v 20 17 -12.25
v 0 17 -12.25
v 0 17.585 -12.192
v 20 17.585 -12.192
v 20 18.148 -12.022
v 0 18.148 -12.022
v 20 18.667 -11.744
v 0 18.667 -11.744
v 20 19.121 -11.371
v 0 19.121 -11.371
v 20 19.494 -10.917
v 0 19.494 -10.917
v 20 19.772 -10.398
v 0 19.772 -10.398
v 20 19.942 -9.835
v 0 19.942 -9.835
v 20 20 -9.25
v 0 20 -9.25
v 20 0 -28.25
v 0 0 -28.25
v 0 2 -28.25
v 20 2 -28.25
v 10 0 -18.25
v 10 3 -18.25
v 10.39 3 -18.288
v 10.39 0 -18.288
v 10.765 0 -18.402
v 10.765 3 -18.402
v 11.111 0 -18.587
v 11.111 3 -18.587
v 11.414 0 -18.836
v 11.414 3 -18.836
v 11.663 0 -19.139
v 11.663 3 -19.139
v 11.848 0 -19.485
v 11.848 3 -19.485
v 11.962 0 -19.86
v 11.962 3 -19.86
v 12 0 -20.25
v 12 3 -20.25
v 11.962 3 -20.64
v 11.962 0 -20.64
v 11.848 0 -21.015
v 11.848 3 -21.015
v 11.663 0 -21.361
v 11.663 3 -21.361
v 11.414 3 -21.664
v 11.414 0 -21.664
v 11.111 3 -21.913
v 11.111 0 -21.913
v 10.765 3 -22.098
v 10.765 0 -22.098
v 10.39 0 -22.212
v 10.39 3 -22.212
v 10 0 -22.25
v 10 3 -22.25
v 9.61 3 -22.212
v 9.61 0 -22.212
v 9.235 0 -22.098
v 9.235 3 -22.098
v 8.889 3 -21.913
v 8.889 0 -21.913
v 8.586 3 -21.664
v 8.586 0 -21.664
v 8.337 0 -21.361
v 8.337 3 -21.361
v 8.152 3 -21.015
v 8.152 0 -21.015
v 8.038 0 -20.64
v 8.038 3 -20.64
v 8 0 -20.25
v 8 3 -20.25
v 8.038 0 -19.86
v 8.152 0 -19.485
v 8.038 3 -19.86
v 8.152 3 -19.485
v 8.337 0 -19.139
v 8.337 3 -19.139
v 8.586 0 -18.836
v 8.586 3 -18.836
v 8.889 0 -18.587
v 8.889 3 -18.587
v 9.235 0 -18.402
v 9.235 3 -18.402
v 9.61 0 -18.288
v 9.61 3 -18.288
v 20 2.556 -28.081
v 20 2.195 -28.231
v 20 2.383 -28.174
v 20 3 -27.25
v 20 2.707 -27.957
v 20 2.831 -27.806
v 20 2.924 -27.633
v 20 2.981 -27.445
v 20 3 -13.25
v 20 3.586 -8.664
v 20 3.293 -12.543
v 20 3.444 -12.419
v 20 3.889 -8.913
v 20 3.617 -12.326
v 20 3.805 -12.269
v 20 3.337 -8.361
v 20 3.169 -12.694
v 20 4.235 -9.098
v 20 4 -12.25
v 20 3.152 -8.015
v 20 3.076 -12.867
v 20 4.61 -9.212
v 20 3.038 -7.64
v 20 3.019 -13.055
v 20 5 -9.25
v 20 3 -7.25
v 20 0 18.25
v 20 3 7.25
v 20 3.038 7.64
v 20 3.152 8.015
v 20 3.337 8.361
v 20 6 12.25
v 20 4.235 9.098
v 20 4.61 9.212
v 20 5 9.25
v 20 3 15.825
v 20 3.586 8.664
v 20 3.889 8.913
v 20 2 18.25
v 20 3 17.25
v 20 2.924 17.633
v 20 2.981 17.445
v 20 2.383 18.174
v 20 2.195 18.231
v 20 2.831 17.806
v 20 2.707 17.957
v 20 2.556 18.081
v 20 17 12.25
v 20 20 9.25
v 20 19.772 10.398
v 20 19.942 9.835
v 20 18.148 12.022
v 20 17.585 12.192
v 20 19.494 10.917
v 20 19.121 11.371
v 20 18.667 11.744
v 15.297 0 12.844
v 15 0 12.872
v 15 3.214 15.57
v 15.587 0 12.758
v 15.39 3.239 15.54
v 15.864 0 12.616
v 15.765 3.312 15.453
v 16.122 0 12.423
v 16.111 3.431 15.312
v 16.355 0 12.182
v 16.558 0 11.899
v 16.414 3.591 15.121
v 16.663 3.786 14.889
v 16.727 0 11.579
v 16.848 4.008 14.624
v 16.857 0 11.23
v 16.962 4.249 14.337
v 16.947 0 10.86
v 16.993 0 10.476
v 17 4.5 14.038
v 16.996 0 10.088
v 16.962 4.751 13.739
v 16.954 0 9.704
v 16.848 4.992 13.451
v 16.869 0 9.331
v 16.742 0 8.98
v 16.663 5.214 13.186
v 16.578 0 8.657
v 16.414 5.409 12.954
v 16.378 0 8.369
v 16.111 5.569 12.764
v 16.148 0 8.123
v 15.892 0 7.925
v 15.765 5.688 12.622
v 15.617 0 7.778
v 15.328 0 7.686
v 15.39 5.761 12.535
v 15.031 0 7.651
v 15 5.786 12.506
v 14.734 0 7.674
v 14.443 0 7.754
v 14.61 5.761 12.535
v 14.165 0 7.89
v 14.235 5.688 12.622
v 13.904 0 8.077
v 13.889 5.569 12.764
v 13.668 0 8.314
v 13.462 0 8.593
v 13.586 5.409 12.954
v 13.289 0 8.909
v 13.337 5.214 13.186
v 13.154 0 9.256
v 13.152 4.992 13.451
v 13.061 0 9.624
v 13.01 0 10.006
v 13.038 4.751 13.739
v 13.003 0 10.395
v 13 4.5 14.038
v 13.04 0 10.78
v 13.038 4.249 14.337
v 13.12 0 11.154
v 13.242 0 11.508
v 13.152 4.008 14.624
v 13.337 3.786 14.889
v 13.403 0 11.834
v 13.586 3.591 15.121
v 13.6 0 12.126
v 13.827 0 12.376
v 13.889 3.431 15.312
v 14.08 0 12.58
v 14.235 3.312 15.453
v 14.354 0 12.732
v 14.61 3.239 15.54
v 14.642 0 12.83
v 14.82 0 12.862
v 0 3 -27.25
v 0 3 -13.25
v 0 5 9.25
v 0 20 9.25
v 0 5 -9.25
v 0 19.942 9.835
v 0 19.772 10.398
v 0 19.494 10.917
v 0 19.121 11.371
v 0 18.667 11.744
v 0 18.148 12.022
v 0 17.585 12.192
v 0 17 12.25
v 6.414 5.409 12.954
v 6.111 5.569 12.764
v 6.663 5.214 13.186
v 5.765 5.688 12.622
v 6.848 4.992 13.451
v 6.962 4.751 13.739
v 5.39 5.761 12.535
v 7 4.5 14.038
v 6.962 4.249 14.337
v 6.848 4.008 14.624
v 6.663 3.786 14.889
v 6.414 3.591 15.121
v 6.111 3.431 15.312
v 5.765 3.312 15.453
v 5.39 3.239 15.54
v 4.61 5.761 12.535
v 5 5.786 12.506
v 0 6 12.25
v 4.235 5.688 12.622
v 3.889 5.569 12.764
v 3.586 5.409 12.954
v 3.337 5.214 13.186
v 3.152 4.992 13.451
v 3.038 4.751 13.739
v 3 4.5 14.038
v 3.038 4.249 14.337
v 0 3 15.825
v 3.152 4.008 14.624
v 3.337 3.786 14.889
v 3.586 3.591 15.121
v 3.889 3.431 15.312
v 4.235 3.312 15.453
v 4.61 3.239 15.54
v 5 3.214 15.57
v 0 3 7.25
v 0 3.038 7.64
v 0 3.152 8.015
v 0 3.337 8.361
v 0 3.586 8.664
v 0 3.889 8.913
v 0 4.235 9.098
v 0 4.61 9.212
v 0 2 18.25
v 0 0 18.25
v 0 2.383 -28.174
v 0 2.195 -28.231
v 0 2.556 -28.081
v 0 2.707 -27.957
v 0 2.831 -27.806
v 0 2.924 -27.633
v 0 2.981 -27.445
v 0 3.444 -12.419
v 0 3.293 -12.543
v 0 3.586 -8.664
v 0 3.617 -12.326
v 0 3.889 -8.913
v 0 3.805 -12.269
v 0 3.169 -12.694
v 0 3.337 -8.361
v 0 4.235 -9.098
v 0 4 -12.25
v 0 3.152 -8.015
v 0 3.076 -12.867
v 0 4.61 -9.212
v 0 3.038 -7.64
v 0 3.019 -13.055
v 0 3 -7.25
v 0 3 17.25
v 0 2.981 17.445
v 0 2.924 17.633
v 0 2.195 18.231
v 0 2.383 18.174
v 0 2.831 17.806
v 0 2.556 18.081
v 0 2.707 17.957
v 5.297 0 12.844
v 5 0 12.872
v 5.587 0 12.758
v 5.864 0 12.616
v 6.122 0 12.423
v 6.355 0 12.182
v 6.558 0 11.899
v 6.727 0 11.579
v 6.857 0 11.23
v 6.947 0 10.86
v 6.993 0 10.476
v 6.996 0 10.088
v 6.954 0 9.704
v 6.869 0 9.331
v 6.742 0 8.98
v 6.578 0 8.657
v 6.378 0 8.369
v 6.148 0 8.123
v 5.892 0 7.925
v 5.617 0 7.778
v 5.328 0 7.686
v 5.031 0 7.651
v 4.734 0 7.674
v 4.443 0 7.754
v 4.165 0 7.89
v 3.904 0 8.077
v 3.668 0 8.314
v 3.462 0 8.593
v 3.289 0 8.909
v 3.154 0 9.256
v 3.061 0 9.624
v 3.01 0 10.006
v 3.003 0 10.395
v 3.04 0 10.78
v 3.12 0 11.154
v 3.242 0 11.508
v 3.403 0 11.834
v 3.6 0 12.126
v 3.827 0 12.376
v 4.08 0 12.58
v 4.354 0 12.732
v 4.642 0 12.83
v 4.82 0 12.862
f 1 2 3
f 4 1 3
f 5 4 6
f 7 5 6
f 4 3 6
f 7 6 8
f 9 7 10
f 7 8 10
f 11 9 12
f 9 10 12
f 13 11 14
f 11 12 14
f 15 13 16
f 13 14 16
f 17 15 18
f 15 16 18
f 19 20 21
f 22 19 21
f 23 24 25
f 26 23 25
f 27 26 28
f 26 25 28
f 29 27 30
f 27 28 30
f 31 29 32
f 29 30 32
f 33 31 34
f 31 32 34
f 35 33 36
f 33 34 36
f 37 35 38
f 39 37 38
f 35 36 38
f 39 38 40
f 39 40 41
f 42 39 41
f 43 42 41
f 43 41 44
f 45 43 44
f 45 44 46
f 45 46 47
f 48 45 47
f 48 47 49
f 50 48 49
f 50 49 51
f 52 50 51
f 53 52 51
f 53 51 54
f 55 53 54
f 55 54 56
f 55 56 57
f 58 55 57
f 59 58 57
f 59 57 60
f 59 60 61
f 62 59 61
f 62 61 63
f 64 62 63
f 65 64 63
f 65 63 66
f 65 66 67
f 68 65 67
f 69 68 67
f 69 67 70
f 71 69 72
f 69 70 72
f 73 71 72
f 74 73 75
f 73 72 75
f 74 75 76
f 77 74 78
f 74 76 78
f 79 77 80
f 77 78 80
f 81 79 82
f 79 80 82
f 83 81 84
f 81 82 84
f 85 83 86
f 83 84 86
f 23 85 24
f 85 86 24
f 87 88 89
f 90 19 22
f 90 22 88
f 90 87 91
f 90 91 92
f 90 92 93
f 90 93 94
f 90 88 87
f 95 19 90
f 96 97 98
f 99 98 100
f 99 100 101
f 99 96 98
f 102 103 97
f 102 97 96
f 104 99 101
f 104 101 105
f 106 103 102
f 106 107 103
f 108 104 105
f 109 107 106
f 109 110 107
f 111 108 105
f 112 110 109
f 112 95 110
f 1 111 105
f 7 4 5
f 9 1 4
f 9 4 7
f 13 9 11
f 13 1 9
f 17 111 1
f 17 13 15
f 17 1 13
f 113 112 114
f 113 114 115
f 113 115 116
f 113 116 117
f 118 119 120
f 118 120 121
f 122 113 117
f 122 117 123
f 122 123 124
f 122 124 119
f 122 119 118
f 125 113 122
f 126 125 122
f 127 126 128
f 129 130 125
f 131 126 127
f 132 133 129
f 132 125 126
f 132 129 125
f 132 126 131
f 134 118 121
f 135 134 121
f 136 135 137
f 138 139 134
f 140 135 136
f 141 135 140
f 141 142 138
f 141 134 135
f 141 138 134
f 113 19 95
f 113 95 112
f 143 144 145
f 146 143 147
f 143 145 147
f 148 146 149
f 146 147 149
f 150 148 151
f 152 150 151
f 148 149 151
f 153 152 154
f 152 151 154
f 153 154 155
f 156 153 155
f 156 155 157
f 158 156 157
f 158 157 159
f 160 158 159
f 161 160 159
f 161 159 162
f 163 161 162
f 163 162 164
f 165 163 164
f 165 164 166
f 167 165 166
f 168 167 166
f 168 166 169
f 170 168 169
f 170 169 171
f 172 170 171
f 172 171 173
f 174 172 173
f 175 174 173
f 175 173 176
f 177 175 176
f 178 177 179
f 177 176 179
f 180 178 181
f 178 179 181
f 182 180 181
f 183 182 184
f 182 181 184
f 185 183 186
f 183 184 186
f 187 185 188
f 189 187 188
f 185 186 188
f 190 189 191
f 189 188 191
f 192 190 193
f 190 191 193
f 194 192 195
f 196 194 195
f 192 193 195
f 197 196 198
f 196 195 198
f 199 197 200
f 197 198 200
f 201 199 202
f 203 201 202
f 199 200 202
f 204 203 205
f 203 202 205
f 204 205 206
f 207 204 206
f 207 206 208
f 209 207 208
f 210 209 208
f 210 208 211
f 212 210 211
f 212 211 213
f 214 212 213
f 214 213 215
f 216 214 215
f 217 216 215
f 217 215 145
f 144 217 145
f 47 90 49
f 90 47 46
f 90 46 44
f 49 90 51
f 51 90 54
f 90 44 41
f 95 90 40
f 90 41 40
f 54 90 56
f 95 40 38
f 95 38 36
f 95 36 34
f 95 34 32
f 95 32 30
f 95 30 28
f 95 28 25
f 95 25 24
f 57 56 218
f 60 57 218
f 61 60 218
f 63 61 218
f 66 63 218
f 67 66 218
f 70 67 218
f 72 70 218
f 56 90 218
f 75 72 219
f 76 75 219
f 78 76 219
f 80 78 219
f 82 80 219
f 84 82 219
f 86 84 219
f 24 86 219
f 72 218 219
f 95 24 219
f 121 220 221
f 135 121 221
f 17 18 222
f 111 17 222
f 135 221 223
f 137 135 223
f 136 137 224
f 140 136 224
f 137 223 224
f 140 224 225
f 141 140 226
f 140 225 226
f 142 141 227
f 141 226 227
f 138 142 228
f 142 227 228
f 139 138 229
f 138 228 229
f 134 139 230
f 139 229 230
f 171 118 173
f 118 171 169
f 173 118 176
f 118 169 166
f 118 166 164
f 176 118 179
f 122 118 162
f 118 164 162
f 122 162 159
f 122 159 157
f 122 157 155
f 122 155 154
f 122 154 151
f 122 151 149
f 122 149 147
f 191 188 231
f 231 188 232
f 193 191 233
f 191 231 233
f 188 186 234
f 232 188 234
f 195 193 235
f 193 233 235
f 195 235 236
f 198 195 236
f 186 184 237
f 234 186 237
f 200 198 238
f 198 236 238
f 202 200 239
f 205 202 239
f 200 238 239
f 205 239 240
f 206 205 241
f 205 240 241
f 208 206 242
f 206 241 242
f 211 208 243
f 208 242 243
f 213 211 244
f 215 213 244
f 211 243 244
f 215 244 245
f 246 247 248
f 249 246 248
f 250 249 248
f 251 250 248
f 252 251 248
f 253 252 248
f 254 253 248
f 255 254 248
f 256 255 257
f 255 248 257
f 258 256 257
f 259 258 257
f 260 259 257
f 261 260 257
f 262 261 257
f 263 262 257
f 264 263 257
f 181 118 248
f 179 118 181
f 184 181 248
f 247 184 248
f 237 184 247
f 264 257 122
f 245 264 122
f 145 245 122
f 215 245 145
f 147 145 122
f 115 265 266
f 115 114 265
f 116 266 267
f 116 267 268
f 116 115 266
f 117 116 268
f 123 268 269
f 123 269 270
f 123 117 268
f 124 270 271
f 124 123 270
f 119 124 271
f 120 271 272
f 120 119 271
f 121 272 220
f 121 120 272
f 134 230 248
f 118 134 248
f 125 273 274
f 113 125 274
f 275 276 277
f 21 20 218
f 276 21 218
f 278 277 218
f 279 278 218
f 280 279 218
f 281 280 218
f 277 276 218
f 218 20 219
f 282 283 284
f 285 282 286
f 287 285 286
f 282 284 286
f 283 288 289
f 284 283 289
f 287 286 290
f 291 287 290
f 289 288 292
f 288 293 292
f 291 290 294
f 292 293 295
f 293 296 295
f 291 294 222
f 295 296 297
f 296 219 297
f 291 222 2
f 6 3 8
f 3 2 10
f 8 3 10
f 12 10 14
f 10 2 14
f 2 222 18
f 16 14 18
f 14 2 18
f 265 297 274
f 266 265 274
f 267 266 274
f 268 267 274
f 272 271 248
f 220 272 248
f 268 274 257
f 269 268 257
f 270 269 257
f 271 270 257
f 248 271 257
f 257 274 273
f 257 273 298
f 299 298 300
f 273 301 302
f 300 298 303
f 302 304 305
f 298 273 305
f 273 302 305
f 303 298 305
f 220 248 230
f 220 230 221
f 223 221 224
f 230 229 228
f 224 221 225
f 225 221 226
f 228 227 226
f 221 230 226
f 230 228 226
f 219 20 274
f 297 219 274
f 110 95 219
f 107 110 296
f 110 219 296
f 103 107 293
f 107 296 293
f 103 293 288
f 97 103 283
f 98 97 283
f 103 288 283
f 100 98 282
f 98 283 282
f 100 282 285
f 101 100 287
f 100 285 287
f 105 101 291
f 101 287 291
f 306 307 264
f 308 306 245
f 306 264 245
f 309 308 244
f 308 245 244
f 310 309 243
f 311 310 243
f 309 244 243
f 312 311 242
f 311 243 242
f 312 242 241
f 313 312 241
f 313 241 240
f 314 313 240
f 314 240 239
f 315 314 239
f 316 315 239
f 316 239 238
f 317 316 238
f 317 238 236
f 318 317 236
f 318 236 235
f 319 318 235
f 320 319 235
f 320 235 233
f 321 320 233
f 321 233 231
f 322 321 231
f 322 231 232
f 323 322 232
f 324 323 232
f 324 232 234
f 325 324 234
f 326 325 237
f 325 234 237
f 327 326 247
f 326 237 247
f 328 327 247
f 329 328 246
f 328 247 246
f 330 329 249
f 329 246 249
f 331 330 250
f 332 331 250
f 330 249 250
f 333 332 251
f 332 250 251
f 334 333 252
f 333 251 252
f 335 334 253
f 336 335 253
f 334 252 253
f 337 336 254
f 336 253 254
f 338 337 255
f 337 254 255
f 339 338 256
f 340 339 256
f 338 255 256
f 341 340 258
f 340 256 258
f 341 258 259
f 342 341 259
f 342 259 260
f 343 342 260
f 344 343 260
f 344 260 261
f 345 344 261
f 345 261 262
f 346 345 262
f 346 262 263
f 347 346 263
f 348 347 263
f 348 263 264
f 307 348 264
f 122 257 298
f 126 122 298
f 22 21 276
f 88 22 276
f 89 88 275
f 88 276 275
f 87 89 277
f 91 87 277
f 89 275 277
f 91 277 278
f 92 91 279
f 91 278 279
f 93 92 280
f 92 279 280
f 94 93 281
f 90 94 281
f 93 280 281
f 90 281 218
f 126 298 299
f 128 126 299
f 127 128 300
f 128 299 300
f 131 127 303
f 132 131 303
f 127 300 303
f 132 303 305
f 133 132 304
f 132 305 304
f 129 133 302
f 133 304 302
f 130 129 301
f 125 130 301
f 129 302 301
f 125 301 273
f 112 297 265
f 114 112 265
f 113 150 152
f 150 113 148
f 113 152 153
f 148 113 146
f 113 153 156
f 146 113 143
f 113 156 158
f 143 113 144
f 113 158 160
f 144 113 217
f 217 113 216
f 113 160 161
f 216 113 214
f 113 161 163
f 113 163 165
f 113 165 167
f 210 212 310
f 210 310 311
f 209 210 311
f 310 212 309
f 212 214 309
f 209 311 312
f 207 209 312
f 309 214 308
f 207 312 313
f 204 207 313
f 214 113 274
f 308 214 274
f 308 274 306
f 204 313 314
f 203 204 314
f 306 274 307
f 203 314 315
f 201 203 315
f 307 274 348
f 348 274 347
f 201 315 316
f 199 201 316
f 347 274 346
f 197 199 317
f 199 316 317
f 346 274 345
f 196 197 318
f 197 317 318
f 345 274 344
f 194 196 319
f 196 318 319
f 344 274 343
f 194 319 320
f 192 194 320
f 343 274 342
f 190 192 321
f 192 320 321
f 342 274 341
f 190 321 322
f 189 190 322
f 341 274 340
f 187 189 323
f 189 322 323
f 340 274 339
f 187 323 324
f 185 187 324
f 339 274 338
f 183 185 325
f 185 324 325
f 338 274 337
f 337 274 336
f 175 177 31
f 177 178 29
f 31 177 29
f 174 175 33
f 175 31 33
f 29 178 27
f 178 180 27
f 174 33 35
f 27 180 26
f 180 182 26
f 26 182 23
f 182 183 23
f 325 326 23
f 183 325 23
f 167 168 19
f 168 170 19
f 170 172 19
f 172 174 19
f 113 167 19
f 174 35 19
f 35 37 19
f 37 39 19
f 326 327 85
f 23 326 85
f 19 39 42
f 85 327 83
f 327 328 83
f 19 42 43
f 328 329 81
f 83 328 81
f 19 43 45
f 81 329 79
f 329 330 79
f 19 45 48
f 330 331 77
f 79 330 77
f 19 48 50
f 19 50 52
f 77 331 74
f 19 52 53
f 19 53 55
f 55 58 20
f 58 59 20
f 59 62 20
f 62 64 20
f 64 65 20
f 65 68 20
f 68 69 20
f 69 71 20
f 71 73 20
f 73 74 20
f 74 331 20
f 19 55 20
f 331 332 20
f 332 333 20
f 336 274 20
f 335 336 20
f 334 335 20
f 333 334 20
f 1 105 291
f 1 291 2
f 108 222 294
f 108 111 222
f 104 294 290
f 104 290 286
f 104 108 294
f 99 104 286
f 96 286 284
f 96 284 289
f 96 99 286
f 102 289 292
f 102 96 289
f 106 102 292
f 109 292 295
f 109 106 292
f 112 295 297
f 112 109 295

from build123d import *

# Parameters (mm, degrees)
RESSALTO_EXTRUS_O1_DEPTH = 20
FILETE12_R               = 2
CHANFRO1_SIZE            = 3
CHANFRO1_SIZE2           = 3.575260778
ESBO_O3_R                = 2
CORTE_EXTRUS_O1_DEPTH    = 43.712437978
ESBO_O4_R                = 2
CORTE_EXTRUS_O2_DEPTH    = 10


with BuildPart() as part:
    # Esboço2 → Ressalto-extrusão1 (new body)
    with BuildSketch(Plane(origin=(0, 0, 0), x_dir=(0, 0, -1), z_dir=(1, 0, 0))):
        with BuildLine():
            Line((-18.25, 0), (18.25, 0))
            Line((18.25, 0), (28.25, 0))
            Line((28.25, 0), (28.25, 2))
            ThreePointArc((28.25, 2), (27.957106781, 2.707106781), (27.25, 3))
            Line((27.25, 3), (13.25, 3))
            ThreePointArc((13.25, 3), (12.542893219, 3.292893219), (12.25, 4))
            Line((12.25, 4), (12.25, 17))
            ThreePointArc((12.25, 17), (11.371320344, 19.121320344), (9.25, 20))
            Line((9.25, 20), (9.25, 3))
            Line((9.25, 3), (-9.25, 3))
            Line((-9.25, 3), (-9.25, 20))
            ThreePointArc((-9.25, 20), (-11.371320344, 19.121320344), (-12.25, 17))
            Line((-12.25, 17), (-12.25, 3))
            Line((-12.25, 3), (-17.25, 3))
            ThreePointArc((-17.25, 3), (-17.957106781, 2.707106781), (-18.25, 2))
            Line((-18.25, 2), (-18.25, 0))
        make_face()
    extrude(amount=RESSALTO_EXTRUS_O1_DEPTH)

    # Filete12
    filete12_edges = [part.edges().sort_by_distance(p)[0] for p in [
        (10, 3, 9.25),
        (10, 3, -9.25),
    ]]
    fillet(filete12_edges, radius=FILETE12_R)

    # Chanfro1
    chanfro1_edges = [part.edges().sort_by_distance(p)[0] for p in [
        (10, 3, 12.25),
    ]]
    chanfro1_side = [part.faces().sort_by_distance(p)[0] for p in [
        (10, 10, 12.25),
    ]]
    chamfer(chanfro1_edges, length=CHANFRO1_SIZE, length2=CHANFRO1_SIZE2, reference=chanfro1_side[0])

    # Esboço3 → Corte-extrusão1 (cut, through all)
    with BuildSketch(Plane(origin=(0, 9.55289202, 8.015828171), x_dir=(1, 0, 0), z_dir=(0, 0.7660444431189817, 0.6427876096865351))):
        with Locations((5, -7.86090451)):
            Circle(ESBO_O3_R)
        with Locations((15, -7.86090451)):
            Circle(ESBO_O3_R)
    extrude(amount=-CORTE_EXTRUS_O1_DEPTH, mode=Mode.SUBTRACT)

    # Esboço4 → Corte-extrusão2 (cut)
    with BuildSketch(Plane(origin=(0, 3, 0), x_dir=(1, 0, 0), z_dir=(0, 1, 0))):
        with Locations((10, 20.25)):
            Circle(ESBO_O4_R)
    extrude(amount=-CORTE_EXTRUS_O2_DEPTH, mode=Mode.SUBTRACT)


solid = part.part
